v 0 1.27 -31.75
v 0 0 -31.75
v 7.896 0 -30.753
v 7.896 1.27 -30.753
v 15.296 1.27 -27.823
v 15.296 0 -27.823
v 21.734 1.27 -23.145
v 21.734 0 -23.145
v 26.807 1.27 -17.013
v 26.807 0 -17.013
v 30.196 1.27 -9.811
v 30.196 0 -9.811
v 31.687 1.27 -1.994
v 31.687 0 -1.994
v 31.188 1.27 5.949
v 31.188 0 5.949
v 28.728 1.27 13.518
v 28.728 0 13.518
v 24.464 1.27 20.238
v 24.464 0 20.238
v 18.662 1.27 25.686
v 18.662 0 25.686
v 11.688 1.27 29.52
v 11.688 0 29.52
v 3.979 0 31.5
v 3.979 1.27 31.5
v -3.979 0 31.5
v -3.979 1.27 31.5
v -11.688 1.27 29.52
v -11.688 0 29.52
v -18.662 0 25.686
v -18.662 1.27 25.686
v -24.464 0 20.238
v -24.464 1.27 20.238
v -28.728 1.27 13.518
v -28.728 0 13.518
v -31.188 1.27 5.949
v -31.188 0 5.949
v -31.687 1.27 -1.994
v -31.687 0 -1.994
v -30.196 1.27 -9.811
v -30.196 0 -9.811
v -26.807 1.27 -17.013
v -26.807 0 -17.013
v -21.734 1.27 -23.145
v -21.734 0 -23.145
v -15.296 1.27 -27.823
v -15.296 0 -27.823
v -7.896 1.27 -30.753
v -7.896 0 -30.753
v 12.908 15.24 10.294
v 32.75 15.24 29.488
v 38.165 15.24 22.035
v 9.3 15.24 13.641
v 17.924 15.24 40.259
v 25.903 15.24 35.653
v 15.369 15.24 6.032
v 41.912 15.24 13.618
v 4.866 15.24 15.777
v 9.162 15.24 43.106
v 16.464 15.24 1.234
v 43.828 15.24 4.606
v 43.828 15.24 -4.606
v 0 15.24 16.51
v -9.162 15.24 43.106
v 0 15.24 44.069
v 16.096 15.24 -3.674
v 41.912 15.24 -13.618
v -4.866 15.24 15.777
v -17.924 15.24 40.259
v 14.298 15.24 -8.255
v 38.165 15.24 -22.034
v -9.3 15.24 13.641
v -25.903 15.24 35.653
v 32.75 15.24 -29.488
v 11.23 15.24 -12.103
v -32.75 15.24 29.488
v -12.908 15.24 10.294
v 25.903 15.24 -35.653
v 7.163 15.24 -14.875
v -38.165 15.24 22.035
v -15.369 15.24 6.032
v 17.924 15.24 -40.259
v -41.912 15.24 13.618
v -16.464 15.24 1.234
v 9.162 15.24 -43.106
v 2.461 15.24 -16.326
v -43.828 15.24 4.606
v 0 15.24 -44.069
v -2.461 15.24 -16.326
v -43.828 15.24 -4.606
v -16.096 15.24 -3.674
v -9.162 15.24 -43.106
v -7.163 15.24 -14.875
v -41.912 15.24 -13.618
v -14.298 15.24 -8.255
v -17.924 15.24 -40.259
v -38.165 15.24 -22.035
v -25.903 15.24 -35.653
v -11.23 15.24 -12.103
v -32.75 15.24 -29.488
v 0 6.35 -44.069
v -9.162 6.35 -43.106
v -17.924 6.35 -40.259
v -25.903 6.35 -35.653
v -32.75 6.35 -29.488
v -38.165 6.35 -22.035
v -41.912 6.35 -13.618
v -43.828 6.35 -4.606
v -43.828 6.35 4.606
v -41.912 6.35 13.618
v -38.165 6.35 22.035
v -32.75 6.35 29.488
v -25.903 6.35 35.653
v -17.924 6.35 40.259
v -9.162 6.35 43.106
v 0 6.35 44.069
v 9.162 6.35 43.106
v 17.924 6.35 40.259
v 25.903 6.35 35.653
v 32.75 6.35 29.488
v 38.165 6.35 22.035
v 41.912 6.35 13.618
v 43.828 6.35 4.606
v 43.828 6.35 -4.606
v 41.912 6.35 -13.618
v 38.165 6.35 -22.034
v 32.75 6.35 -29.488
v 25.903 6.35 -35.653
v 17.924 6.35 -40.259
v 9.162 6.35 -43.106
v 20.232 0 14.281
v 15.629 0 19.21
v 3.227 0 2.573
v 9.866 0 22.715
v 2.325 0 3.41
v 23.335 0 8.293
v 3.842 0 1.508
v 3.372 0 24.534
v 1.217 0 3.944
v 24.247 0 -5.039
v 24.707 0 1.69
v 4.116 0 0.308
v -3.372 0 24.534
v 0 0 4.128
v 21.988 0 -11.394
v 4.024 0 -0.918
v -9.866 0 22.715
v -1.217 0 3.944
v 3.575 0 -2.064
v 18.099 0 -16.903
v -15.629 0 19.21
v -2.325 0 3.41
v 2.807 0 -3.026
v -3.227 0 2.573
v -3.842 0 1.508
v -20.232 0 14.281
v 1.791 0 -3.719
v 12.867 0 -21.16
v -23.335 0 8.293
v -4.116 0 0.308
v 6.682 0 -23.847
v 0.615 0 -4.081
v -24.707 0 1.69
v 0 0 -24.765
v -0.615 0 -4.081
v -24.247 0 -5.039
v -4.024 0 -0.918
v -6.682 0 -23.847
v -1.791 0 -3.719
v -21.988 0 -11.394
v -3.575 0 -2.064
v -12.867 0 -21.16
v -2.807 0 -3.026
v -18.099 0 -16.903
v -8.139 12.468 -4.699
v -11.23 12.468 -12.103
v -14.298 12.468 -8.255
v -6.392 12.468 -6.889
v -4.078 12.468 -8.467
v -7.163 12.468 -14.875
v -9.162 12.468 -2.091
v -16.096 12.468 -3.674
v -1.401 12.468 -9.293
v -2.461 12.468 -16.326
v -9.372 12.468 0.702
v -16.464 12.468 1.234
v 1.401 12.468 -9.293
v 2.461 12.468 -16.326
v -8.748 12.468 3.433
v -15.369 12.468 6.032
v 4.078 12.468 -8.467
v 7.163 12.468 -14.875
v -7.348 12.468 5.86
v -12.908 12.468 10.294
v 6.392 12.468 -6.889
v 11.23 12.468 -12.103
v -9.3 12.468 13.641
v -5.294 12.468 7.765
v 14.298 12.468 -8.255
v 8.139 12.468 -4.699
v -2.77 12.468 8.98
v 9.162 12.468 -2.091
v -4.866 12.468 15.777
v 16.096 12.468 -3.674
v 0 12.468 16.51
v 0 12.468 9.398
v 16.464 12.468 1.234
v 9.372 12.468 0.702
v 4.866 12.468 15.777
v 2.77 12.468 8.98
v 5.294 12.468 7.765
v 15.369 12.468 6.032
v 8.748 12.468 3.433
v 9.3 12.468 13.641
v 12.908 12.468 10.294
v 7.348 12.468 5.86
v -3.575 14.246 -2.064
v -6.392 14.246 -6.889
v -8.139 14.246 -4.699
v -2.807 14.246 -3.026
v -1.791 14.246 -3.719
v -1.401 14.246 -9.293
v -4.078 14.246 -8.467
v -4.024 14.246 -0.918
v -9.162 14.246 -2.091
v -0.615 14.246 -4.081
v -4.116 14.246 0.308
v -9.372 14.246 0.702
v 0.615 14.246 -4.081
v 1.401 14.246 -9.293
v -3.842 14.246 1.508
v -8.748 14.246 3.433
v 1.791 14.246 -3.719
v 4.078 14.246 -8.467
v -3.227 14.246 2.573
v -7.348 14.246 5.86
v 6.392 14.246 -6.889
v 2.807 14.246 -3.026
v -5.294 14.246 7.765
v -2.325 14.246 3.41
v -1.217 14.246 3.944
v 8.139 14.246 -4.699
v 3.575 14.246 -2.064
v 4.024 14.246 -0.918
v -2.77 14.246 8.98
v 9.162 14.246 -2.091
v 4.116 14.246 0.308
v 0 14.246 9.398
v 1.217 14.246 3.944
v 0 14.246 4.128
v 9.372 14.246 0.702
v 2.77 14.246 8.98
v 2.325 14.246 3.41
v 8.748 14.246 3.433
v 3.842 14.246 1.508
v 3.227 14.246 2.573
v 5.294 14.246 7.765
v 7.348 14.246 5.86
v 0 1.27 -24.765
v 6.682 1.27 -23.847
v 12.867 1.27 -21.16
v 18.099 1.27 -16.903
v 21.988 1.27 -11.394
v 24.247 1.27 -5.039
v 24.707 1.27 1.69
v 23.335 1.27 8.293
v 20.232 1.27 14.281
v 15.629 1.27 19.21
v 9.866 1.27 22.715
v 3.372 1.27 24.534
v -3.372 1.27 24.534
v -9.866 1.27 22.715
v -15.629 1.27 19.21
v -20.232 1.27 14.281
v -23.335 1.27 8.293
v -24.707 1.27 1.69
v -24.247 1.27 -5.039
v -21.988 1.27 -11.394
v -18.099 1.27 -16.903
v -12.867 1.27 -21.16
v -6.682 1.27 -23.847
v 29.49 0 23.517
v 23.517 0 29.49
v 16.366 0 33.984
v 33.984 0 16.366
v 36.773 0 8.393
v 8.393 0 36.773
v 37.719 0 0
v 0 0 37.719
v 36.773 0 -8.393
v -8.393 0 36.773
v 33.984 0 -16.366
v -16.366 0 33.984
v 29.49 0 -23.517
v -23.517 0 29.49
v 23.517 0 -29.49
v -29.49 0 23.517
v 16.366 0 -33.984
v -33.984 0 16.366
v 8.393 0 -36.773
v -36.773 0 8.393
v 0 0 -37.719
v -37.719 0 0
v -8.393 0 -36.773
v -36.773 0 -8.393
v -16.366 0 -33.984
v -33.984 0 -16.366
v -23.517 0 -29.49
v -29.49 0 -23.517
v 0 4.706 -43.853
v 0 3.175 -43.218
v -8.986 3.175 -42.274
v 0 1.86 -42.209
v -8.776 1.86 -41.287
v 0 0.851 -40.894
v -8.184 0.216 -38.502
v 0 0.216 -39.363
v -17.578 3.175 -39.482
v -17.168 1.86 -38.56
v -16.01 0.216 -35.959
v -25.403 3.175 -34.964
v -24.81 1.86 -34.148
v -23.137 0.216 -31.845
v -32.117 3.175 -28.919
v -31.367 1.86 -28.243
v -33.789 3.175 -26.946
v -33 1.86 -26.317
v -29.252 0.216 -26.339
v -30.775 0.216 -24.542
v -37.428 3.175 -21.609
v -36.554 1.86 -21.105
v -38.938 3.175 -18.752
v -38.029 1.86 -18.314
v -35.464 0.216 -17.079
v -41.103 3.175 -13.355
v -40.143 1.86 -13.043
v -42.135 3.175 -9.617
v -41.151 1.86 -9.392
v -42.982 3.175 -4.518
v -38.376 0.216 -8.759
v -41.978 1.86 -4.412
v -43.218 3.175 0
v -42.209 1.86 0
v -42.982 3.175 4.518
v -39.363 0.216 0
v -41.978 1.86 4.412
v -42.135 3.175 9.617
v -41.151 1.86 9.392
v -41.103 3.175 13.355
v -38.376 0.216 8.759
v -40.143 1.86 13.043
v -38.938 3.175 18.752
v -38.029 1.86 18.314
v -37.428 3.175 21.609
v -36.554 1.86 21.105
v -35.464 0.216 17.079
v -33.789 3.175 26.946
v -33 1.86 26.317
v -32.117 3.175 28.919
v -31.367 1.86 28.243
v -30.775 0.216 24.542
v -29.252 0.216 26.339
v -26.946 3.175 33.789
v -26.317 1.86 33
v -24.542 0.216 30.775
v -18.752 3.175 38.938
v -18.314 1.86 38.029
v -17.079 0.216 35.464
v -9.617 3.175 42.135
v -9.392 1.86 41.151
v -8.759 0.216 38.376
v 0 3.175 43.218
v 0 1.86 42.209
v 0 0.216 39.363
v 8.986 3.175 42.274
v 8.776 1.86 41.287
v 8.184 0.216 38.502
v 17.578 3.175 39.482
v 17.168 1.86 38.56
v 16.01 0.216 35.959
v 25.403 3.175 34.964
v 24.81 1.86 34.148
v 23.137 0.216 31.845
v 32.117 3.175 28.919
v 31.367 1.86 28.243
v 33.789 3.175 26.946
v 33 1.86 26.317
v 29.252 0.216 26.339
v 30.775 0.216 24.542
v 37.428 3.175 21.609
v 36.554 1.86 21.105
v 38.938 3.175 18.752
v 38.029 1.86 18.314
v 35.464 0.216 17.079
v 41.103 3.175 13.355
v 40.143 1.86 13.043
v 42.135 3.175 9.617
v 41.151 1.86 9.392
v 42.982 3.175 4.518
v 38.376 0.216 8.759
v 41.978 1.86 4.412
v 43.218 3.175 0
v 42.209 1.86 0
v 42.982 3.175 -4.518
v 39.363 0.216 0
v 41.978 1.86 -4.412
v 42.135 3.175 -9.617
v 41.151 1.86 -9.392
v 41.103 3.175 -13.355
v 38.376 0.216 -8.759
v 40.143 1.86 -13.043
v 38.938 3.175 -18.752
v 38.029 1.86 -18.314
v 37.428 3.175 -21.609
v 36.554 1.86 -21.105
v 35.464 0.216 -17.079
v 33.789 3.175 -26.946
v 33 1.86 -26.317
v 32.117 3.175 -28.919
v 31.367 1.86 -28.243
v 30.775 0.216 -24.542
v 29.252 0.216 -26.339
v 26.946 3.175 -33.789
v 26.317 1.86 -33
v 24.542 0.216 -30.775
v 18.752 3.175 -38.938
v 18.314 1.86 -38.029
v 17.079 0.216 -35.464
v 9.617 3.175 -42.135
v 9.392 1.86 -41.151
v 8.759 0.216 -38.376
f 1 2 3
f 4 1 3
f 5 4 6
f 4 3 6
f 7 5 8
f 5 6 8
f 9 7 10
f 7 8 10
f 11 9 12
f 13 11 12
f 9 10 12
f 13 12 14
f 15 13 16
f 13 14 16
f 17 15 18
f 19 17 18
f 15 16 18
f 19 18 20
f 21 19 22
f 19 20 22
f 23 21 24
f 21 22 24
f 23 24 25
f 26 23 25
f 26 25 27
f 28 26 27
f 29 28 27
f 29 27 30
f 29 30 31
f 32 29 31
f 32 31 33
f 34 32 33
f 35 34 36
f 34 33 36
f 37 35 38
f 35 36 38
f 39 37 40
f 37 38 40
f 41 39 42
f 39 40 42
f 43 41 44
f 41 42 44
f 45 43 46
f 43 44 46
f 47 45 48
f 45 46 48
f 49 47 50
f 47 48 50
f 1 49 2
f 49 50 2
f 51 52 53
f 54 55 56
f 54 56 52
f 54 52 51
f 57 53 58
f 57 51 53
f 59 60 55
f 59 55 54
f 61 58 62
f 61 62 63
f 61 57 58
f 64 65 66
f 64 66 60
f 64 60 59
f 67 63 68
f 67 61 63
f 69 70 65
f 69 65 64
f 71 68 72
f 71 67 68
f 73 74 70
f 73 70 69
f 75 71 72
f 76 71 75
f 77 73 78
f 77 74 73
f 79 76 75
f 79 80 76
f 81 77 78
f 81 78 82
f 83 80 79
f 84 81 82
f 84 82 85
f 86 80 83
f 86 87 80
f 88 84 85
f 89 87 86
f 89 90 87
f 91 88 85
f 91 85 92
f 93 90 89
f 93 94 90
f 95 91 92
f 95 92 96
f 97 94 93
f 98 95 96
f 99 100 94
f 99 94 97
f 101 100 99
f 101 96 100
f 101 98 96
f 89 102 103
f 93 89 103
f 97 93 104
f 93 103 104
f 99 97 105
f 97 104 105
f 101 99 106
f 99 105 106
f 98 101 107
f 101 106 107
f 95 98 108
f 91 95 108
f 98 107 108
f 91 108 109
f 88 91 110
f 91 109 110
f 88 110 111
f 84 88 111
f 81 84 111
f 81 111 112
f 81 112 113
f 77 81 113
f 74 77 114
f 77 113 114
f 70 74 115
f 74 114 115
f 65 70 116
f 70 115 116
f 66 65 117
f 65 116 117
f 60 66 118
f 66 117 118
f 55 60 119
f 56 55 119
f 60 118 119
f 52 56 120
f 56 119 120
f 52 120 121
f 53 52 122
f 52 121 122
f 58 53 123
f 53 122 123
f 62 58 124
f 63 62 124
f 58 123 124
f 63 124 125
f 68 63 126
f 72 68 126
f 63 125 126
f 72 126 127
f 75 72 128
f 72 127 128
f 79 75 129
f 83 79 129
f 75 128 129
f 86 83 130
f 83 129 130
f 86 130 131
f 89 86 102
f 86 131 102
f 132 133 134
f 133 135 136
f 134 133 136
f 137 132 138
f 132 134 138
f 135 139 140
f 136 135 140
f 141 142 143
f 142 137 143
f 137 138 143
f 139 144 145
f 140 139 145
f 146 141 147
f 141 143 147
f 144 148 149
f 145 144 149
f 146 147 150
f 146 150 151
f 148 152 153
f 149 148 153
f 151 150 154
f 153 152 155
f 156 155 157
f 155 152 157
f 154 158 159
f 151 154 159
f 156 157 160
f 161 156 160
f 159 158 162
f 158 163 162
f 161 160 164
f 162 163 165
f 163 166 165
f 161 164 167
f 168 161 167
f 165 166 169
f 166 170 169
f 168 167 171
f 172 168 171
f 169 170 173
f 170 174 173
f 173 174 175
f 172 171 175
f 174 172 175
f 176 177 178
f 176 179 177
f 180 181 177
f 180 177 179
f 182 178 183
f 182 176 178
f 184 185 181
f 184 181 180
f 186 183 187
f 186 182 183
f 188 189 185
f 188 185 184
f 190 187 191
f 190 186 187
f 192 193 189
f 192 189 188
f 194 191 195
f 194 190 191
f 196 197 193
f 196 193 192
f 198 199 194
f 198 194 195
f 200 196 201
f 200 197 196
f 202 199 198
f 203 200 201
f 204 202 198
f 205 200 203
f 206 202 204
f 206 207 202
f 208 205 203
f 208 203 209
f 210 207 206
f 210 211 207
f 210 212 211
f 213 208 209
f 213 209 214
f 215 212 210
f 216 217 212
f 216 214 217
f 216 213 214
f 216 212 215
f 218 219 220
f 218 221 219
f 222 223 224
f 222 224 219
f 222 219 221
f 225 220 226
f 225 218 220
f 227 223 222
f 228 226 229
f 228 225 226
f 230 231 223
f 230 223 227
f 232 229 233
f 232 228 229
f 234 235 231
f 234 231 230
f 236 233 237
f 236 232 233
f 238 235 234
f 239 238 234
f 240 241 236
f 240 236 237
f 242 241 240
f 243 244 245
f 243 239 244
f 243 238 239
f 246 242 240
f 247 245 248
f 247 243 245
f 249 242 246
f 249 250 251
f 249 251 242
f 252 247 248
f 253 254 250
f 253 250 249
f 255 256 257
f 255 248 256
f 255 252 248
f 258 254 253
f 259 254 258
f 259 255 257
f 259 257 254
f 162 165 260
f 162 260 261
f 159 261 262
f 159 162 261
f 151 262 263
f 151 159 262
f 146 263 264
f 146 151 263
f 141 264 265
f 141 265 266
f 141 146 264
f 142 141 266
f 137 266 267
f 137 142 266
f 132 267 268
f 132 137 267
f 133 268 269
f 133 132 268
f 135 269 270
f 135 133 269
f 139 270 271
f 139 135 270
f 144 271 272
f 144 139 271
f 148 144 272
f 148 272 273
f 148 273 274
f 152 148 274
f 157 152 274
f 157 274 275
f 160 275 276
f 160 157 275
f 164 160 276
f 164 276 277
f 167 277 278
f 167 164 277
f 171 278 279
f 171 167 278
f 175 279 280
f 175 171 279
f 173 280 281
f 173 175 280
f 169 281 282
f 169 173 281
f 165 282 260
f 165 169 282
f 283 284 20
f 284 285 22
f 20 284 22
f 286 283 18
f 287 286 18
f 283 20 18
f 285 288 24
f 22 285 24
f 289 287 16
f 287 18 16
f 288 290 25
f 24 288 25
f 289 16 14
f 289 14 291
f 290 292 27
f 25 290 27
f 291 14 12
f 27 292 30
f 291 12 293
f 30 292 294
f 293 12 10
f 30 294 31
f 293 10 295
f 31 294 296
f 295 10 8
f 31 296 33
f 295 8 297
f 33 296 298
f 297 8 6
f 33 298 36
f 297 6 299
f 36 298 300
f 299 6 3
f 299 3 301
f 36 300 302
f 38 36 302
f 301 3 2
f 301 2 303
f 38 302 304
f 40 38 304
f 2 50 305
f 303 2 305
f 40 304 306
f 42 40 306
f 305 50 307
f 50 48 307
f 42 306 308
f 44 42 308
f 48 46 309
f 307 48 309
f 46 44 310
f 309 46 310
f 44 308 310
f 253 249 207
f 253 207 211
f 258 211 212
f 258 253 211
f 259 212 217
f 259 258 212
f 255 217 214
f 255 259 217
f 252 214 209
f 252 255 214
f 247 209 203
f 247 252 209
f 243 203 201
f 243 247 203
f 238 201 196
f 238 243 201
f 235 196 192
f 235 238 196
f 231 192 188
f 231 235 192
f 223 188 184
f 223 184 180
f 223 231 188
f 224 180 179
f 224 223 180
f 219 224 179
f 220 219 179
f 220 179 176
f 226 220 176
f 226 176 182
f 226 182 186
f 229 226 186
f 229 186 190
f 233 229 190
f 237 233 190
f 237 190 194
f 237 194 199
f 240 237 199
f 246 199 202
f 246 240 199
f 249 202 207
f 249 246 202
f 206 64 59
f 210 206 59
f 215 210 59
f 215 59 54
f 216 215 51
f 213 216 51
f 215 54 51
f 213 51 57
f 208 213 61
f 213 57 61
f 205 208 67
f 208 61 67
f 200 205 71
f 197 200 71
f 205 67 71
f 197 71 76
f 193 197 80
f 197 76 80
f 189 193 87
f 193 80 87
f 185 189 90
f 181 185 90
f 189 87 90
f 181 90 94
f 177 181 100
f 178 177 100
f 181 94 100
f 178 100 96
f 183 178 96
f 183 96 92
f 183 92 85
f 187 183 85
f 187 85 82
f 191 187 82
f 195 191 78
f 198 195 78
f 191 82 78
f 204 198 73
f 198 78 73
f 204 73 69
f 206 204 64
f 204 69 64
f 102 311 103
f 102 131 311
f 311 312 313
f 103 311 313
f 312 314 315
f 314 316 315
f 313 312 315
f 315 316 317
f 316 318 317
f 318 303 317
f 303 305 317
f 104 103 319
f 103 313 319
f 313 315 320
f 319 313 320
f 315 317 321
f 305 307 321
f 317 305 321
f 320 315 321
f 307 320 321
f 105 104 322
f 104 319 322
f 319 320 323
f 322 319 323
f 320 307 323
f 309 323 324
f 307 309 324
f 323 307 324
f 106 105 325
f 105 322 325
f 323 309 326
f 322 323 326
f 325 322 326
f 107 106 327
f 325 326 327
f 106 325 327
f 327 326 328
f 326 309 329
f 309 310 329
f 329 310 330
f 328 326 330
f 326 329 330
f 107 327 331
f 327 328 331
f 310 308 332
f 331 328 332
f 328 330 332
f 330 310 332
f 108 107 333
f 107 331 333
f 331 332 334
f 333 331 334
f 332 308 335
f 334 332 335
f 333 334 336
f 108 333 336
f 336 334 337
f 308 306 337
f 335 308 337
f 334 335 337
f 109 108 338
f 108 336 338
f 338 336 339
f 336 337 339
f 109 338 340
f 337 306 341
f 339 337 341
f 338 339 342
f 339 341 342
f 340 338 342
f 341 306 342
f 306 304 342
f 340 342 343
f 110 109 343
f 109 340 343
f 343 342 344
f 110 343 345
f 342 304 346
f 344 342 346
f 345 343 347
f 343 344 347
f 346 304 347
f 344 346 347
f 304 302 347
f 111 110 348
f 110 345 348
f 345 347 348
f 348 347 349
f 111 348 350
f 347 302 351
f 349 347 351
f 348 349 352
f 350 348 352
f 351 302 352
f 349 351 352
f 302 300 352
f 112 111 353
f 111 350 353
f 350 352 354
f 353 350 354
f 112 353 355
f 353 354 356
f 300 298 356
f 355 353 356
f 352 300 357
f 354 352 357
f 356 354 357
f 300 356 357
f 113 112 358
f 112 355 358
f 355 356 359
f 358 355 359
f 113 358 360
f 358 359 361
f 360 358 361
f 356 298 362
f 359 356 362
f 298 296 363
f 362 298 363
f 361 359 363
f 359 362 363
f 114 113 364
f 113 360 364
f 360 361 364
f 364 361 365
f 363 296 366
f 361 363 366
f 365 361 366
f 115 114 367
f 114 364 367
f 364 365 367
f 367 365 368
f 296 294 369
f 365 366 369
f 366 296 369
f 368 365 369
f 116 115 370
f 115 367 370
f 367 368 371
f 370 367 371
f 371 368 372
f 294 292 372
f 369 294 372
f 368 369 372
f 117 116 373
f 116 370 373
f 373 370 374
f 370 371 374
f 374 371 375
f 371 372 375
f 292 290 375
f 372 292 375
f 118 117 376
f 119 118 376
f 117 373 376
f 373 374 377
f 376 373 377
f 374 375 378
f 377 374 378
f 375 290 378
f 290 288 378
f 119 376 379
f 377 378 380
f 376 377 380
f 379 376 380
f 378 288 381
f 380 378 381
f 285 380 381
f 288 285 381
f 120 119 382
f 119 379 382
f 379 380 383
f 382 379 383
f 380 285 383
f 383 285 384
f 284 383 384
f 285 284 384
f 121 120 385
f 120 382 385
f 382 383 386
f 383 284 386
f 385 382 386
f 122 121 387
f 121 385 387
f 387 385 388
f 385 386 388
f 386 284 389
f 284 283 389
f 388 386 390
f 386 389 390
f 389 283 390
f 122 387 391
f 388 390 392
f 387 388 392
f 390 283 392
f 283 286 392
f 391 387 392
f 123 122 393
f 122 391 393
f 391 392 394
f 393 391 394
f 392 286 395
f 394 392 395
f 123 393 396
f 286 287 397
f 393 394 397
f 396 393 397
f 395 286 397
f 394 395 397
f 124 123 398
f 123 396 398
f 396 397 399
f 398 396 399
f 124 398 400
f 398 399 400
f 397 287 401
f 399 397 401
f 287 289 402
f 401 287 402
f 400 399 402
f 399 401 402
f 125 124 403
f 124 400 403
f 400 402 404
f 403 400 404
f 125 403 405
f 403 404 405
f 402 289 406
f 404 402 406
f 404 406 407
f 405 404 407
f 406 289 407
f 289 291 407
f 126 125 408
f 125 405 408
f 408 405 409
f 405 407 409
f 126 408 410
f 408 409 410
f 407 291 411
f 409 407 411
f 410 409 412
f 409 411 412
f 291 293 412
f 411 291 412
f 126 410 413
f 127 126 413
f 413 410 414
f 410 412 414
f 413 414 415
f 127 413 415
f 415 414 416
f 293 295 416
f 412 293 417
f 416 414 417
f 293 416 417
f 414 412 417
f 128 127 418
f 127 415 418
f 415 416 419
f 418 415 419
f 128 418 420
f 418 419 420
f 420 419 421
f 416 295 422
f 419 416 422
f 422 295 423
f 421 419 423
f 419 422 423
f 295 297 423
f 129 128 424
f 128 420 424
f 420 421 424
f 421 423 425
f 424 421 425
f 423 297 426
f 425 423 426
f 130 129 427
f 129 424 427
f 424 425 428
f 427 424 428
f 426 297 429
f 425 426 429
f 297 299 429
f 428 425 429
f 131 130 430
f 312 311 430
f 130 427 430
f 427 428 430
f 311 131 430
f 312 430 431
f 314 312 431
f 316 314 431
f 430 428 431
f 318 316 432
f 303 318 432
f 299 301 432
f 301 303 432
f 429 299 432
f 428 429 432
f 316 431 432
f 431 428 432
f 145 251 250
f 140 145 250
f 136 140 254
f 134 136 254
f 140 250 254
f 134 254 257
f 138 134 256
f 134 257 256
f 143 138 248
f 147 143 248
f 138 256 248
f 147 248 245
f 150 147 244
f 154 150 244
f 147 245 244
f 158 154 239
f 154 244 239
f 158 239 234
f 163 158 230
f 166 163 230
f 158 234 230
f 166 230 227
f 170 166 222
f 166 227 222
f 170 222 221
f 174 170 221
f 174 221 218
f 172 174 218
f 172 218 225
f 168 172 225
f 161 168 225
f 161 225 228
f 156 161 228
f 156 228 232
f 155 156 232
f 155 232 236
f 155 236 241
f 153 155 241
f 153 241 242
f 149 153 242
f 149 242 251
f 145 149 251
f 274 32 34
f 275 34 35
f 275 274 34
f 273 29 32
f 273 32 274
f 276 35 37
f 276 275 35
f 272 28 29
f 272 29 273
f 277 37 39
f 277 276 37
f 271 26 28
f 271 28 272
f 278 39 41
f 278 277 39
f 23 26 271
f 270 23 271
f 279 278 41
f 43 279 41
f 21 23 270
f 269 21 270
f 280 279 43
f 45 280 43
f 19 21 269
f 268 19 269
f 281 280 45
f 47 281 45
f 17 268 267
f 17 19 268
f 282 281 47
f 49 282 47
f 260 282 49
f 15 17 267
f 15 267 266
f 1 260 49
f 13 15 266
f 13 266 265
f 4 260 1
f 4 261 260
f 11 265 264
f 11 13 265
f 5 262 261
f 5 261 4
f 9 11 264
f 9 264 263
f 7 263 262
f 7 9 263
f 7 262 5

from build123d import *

# Parameters (mm, degrees)
SKETCH1_R           = 44.069
BOSS_EXTRUDE1_DEPTH = 15.24
SKETCH3_R           = 16.51
CUT_EXTRUDE1_DEPTH  = 2.771775
SKETCH4_R           = 4.1275
CUT_EXTRUDE2_DEPTH  = 64.557927567
BOSS_EXTRUDE2_START = 1.778
SKETCH5_R           = 9.398
SKETCH5_R_2         = 4.1275
BOSS_EXTRUDE2_DEPTH = 1.778
FILLET1_R           = 6.35
SKETCH6_R           = 31.75
SKETCH6_R_2         = 24.765
CUT_EXTRUDE3_DEPTH  = 1.27


with BuildPart() as part:
    # Sketch1 → Boss-Extrude1 (new body)
    with BuildSketch(Plane(origin=(0, 0, 0), x_dir=(1, 0, 0), z_dir=(0, 1, 0))):
        with Locations(Location((0, 0, 0), (0, 0, 90))):
            Circle(SKETCH1_R)
    extrude(amount=BOSS_EXTRUDE1_DEPTH)

    # Sketch3 → Cut-Extrude1 (cut)
    with BuildSketch(Plane(origin=(0, 15.24, 0), x_dir=(1, 0, 0), z_dir=(0, 1, 0))):
        with Locations(Location((0, 0, 0), (0, 0, 270))):
            Circle(SKETCH3_R)
    extrude(amount=-CUT_EXTRUDE1_DEPTH, mode=Mode.SUBTRACT)

    # Sketch4 → Cut-Extrude2 (cut, through all)
    with BuildSketch(Plane(origin=(0, 12.468225, 0), x_dir=(1, 0, 0), z_dir=(0, 1, 0))):
        with Locations(Location((0, 0, 0), (0, 0, 270))):
            Circle(SKETCH4_R)
    extrude(amount=-CUT_EXTRUDE2_DEPTH, mode=Mode.SUBTRACT)

    # Sketch5 → Boss-Extrude2 (add)
    with BuildSketch(Plane(origin=(0, 12.468225, 0), x_dir=(1, 0, 0), z_dir=(0, 1, 0)).offset(BOSS_EXTRUDE2_START)):
        with Locations(Location((0, 0, 0), (0, 0, 270))):
            Circle(SKETCH5_R)
        with Locations(Location((0, 0, 0), (0, 0, 270))):
            Circle(SKETCH5_R_2, mode=Mode.SUBTRACT)
    extrude(amount=-BOSS_EXTRUDE2_DEPTH)

    # Fillet1
    fillet1_edges = [part.edges().sort_by_distance(p)[0] for p in [
        (0, 0, 44.069),
    ]]
    fillet(fillet1_edges, radius=FILLET1_R)

    # Sketch6 → Cut-Extrude3 (cut)
    with BuildSketch(Plane.XZ):
        with Locations(Location((0, 0, 0), (0, 0, 270))):
            Circle(SKETCH6_R)
        with Locations(Location((0, 0, 0), (0, 0, 270))):
            Circle(SKETCH6_R_2, mode=Mode.SUBTRACT)
    extrude(amount=-CUT_EXTRUDE3_DEPTH, mode=Mode.SUBTRACT)


solid = part.part
